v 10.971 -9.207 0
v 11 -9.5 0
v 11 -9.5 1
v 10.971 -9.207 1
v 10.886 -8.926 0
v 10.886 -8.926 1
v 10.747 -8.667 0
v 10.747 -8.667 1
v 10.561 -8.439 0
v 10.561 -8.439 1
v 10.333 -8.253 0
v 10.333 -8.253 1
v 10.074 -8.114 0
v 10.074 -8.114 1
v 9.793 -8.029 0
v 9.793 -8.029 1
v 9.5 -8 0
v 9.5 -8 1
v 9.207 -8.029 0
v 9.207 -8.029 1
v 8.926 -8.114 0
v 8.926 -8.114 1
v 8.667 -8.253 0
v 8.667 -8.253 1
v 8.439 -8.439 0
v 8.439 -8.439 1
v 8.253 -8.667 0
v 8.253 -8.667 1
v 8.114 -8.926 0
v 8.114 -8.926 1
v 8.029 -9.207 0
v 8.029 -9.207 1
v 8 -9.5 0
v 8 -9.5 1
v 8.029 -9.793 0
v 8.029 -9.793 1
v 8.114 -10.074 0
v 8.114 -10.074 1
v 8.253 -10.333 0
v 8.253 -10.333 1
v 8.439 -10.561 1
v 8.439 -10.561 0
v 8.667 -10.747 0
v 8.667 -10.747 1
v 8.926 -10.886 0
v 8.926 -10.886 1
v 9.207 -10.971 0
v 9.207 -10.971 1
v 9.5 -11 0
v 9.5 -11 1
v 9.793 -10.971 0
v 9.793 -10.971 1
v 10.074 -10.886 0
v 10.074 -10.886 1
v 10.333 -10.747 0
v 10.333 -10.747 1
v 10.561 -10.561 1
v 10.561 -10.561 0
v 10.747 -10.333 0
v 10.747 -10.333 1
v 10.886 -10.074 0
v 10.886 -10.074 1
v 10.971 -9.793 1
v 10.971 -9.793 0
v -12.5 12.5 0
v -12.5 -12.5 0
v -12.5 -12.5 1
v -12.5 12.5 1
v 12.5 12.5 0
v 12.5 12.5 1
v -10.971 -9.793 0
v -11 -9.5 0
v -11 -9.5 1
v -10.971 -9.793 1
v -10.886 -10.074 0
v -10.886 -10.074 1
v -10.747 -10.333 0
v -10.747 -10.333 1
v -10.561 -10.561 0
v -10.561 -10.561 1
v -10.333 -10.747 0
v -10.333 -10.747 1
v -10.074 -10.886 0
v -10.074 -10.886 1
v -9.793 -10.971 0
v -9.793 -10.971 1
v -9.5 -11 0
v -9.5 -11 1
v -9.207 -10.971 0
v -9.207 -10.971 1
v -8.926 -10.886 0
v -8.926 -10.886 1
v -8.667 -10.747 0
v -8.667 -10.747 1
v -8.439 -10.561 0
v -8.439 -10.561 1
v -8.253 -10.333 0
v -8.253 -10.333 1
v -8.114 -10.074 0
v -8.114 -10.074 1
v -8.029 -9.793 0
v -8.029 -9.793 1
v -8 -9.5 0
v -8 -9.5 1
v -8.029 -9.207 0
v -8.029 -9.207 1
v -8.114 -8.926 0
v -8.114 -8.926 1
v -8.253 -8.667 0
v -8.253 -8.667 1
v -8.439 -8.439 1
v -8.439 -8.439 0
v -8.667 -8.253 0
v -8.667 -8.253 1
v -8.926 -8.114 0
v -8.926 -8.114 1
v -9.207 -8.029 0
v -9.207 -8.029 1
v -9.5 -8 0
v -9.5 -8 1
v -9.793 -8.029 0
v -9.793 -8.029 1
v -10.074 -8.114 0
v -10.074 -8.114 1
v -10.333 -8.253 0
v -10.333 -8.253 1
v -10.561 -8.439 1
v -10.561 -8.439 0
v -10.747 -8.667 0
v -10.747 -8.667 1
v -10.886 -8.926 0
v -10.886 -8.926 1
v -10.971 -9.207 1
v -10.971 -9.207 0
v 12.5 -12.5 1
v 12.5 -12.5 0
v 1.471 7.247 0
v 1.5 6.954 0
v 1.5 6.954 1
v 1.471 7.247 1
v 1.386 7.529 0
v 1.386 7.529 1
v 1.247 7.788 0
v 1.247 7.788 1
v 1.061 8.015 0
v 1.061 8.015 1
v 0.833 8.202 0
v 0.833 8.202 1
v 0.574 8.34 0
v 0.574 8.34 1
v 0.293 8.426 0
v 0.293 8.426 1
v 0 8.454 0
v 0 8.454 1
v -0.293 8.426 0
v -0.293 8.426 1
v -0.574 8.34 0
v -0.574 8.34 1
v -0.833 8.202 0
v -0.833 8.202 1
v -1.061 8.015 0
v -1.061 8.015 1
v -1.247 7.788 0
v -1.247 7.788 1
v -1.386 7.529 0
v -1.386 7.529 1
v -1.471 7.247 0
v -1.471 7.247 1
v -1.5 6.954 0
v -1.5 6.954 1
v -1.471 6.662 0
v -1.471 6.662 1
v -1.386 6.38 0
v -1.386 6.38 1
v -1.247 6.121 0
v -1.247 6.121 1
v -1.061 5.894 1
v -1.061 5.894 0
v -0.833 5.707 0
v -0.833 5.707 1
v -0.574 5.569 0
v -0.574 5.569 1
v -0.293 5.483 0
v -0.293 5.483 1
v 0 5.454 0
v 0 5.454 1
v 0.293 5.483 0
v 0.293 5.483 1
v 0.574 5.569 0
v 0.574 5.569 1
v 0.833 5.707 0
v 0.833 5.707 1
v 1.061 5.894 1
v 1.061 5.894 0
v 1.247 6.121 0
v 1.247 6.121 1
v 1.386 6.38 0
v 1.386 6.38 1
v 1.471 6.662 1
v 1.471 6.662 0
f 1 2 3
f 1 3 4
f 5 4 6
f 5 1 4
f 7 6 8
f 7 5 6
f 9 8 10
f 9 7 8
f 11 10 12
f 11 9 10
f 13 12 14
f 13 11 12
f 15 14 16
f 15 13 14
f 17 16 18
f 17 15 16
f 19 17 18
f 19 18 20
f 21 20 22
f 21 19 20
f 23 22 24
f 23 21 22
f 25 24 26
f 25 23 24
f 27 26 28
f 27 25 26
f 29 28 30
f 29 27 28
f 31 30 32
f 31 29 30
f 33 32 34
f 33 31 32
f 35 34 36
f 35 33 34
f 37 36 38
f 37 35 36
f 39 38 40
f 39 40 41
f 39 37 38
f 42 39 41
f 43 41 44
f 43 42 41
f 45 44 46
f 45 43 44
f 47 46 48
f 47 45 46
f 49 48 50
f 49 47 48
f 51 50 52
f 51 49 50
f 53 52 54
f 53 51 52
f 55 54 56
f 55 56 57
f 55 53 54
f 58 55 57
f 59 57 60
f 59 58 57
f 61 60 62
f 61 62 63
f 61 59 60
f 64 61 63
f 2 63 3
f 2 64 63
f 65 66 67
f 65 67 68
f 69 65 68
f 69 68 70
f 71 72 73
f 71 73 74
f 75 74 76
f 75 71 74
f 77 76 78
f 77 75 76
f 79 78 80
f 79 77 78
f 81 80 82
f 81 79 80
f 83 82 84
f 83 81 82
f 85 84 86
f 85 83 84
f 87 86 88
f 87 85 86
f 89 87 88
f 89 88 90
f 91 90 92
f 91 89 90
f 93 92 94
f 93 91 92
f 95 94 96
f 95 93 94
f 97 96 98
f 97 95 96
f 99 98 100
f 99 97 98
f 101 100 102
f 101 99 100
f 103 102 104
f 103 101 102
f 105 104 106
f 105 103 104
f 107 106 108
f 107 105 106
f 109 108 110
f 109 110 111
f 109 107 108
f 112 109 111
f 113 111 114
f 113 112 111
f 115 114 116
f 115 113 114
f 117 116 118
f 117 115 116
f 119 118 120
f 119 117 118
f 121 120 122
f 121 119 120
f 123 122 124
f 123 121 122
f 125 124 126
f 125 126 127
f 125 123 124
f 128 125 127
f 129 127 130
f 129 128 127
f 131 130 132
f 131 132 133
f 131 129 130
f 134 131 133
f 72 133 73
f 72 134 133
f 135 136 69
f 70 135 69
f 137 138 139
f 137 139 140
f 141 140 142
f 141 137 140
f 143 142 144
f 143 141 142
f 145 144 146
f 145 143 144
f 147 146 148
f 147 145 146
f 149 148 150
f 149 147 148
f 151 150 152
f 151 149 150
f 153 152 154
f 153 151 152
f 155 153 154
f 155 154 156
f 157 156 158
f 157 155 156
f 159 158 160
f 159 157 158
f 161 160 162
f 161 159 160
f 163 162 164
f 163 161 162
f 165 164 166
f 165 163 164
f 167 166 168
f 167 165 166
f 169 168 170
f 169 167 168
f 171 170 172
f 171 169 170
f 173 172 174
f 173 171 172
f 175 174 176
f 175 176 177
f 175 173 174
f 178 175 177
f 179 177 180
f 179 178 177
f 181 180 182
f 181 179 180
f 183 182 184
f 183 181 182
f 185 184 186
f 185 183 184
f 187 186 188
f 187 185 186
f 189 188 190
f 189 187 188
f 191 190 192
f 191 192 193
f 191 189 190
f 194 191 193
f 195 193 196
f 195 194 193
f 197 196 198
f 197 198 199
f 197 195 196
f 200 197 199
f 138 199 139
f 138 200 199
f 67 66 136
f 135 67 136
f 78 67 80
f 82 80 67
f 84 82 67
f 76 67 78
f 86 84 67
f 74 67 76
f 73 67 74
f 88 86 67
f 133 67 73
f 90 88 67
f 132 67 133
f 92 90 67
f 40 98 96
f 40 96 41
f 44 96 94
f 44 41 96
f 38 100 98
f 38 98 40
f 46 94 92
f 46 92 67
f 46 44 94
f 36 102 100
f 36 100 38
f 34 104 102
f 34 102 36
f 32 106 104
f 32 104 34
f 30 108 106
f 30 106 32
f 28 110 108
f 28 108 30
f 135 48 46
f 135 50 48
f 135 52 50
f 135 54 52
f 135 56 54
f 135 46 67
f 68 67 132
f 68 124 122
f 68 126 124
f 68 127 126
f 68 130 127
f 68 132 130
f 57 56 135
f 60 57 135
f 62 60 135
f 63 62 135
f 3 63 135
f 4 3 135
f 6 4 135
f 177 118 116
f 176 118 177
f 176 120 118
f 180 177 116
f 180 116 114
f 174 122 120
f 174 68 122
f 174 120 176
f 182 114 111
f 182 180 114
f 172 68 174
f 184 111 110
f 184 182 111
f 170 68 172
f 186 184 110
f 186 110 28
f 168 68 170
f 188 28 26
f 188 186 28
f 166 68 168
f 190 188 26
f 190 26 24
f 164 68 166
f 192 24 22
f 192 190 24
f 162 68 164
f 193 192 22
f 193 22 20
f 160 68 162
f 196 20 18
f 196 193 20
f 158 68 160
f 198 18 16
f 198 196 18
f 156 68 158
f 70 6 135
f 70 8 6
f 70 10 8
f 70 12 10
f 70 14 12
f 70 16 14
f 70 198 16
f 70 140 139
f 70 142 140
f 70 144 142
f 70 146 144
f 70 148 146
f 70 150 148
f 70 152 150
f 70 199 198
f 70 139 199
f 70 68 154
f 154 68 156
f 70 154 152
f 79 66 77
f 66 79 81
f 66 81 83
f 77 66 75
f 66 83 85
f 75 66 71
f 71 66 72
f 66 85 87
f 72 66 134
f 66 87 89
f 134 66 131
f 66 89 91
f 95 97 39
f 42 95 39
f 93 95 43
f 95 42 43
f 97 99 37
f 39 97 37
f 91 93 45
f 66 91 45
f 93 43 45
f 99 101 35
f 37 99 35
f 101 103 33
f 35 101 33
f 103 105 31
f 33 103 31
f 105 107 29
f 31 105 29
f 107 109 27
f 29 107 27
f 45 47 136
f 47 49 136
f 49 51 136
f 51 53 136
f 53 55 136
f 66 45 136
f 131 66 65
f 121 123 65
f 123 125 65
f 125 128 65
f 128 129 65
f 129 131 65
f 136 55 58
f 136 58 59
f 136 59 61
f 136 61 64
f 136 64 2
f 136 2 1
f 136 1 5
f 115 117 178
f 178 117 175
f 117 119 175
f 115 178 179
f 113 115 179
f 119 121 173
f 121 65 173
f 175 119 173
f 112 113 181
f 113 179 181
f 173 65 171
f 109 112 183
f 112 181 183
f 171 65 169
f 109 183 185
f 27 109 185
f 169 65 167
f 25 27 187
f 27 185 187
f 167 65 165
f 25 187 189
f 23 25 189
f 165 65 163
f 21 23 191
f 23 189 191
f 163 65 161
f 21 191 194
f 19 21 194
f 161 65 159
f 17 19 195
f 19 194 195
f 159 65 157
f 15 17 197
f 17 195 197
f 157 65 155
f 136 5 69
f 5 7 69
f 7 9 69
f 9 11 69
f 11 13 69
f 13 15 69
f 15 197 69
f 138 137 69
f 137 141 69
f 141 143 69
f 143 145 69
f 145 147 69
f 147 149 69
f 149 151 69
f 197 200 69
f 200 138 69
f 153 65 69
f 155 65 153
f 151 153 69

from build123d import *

# Parameters (mm, degrees)
SKETCH_1_W      = 25
SKETCH_1_H      = 25
SKETCH_1_R      = 1.5
EXTRUDE_1_DEPTH = 1


with BuildPart() as part:
    # 草图1 → 凸台-拉伸1 (new body)
    with BuildSketch(Plane.XY):
        Rectangle(SKETCH_1_W, SKETCH_1_H)
        with Locations((9.5, -9.5)):
            Circle(SKETCH_1_R, mode=Mode.SUBTRACT)
        with Locations(Location((-9.5, -9.5, 0), (0, 0, 180))):
            Circle(SKETCH_1_R, mode=Mode.SUBTRACT)
        with Locations((0, 6.954482672)):
            Circle(SKETCH_1_R, mode=Mode.SUBTRACT)
    extrude(amount=EXTRUDE_1_DEPTH)


solid = part.part
